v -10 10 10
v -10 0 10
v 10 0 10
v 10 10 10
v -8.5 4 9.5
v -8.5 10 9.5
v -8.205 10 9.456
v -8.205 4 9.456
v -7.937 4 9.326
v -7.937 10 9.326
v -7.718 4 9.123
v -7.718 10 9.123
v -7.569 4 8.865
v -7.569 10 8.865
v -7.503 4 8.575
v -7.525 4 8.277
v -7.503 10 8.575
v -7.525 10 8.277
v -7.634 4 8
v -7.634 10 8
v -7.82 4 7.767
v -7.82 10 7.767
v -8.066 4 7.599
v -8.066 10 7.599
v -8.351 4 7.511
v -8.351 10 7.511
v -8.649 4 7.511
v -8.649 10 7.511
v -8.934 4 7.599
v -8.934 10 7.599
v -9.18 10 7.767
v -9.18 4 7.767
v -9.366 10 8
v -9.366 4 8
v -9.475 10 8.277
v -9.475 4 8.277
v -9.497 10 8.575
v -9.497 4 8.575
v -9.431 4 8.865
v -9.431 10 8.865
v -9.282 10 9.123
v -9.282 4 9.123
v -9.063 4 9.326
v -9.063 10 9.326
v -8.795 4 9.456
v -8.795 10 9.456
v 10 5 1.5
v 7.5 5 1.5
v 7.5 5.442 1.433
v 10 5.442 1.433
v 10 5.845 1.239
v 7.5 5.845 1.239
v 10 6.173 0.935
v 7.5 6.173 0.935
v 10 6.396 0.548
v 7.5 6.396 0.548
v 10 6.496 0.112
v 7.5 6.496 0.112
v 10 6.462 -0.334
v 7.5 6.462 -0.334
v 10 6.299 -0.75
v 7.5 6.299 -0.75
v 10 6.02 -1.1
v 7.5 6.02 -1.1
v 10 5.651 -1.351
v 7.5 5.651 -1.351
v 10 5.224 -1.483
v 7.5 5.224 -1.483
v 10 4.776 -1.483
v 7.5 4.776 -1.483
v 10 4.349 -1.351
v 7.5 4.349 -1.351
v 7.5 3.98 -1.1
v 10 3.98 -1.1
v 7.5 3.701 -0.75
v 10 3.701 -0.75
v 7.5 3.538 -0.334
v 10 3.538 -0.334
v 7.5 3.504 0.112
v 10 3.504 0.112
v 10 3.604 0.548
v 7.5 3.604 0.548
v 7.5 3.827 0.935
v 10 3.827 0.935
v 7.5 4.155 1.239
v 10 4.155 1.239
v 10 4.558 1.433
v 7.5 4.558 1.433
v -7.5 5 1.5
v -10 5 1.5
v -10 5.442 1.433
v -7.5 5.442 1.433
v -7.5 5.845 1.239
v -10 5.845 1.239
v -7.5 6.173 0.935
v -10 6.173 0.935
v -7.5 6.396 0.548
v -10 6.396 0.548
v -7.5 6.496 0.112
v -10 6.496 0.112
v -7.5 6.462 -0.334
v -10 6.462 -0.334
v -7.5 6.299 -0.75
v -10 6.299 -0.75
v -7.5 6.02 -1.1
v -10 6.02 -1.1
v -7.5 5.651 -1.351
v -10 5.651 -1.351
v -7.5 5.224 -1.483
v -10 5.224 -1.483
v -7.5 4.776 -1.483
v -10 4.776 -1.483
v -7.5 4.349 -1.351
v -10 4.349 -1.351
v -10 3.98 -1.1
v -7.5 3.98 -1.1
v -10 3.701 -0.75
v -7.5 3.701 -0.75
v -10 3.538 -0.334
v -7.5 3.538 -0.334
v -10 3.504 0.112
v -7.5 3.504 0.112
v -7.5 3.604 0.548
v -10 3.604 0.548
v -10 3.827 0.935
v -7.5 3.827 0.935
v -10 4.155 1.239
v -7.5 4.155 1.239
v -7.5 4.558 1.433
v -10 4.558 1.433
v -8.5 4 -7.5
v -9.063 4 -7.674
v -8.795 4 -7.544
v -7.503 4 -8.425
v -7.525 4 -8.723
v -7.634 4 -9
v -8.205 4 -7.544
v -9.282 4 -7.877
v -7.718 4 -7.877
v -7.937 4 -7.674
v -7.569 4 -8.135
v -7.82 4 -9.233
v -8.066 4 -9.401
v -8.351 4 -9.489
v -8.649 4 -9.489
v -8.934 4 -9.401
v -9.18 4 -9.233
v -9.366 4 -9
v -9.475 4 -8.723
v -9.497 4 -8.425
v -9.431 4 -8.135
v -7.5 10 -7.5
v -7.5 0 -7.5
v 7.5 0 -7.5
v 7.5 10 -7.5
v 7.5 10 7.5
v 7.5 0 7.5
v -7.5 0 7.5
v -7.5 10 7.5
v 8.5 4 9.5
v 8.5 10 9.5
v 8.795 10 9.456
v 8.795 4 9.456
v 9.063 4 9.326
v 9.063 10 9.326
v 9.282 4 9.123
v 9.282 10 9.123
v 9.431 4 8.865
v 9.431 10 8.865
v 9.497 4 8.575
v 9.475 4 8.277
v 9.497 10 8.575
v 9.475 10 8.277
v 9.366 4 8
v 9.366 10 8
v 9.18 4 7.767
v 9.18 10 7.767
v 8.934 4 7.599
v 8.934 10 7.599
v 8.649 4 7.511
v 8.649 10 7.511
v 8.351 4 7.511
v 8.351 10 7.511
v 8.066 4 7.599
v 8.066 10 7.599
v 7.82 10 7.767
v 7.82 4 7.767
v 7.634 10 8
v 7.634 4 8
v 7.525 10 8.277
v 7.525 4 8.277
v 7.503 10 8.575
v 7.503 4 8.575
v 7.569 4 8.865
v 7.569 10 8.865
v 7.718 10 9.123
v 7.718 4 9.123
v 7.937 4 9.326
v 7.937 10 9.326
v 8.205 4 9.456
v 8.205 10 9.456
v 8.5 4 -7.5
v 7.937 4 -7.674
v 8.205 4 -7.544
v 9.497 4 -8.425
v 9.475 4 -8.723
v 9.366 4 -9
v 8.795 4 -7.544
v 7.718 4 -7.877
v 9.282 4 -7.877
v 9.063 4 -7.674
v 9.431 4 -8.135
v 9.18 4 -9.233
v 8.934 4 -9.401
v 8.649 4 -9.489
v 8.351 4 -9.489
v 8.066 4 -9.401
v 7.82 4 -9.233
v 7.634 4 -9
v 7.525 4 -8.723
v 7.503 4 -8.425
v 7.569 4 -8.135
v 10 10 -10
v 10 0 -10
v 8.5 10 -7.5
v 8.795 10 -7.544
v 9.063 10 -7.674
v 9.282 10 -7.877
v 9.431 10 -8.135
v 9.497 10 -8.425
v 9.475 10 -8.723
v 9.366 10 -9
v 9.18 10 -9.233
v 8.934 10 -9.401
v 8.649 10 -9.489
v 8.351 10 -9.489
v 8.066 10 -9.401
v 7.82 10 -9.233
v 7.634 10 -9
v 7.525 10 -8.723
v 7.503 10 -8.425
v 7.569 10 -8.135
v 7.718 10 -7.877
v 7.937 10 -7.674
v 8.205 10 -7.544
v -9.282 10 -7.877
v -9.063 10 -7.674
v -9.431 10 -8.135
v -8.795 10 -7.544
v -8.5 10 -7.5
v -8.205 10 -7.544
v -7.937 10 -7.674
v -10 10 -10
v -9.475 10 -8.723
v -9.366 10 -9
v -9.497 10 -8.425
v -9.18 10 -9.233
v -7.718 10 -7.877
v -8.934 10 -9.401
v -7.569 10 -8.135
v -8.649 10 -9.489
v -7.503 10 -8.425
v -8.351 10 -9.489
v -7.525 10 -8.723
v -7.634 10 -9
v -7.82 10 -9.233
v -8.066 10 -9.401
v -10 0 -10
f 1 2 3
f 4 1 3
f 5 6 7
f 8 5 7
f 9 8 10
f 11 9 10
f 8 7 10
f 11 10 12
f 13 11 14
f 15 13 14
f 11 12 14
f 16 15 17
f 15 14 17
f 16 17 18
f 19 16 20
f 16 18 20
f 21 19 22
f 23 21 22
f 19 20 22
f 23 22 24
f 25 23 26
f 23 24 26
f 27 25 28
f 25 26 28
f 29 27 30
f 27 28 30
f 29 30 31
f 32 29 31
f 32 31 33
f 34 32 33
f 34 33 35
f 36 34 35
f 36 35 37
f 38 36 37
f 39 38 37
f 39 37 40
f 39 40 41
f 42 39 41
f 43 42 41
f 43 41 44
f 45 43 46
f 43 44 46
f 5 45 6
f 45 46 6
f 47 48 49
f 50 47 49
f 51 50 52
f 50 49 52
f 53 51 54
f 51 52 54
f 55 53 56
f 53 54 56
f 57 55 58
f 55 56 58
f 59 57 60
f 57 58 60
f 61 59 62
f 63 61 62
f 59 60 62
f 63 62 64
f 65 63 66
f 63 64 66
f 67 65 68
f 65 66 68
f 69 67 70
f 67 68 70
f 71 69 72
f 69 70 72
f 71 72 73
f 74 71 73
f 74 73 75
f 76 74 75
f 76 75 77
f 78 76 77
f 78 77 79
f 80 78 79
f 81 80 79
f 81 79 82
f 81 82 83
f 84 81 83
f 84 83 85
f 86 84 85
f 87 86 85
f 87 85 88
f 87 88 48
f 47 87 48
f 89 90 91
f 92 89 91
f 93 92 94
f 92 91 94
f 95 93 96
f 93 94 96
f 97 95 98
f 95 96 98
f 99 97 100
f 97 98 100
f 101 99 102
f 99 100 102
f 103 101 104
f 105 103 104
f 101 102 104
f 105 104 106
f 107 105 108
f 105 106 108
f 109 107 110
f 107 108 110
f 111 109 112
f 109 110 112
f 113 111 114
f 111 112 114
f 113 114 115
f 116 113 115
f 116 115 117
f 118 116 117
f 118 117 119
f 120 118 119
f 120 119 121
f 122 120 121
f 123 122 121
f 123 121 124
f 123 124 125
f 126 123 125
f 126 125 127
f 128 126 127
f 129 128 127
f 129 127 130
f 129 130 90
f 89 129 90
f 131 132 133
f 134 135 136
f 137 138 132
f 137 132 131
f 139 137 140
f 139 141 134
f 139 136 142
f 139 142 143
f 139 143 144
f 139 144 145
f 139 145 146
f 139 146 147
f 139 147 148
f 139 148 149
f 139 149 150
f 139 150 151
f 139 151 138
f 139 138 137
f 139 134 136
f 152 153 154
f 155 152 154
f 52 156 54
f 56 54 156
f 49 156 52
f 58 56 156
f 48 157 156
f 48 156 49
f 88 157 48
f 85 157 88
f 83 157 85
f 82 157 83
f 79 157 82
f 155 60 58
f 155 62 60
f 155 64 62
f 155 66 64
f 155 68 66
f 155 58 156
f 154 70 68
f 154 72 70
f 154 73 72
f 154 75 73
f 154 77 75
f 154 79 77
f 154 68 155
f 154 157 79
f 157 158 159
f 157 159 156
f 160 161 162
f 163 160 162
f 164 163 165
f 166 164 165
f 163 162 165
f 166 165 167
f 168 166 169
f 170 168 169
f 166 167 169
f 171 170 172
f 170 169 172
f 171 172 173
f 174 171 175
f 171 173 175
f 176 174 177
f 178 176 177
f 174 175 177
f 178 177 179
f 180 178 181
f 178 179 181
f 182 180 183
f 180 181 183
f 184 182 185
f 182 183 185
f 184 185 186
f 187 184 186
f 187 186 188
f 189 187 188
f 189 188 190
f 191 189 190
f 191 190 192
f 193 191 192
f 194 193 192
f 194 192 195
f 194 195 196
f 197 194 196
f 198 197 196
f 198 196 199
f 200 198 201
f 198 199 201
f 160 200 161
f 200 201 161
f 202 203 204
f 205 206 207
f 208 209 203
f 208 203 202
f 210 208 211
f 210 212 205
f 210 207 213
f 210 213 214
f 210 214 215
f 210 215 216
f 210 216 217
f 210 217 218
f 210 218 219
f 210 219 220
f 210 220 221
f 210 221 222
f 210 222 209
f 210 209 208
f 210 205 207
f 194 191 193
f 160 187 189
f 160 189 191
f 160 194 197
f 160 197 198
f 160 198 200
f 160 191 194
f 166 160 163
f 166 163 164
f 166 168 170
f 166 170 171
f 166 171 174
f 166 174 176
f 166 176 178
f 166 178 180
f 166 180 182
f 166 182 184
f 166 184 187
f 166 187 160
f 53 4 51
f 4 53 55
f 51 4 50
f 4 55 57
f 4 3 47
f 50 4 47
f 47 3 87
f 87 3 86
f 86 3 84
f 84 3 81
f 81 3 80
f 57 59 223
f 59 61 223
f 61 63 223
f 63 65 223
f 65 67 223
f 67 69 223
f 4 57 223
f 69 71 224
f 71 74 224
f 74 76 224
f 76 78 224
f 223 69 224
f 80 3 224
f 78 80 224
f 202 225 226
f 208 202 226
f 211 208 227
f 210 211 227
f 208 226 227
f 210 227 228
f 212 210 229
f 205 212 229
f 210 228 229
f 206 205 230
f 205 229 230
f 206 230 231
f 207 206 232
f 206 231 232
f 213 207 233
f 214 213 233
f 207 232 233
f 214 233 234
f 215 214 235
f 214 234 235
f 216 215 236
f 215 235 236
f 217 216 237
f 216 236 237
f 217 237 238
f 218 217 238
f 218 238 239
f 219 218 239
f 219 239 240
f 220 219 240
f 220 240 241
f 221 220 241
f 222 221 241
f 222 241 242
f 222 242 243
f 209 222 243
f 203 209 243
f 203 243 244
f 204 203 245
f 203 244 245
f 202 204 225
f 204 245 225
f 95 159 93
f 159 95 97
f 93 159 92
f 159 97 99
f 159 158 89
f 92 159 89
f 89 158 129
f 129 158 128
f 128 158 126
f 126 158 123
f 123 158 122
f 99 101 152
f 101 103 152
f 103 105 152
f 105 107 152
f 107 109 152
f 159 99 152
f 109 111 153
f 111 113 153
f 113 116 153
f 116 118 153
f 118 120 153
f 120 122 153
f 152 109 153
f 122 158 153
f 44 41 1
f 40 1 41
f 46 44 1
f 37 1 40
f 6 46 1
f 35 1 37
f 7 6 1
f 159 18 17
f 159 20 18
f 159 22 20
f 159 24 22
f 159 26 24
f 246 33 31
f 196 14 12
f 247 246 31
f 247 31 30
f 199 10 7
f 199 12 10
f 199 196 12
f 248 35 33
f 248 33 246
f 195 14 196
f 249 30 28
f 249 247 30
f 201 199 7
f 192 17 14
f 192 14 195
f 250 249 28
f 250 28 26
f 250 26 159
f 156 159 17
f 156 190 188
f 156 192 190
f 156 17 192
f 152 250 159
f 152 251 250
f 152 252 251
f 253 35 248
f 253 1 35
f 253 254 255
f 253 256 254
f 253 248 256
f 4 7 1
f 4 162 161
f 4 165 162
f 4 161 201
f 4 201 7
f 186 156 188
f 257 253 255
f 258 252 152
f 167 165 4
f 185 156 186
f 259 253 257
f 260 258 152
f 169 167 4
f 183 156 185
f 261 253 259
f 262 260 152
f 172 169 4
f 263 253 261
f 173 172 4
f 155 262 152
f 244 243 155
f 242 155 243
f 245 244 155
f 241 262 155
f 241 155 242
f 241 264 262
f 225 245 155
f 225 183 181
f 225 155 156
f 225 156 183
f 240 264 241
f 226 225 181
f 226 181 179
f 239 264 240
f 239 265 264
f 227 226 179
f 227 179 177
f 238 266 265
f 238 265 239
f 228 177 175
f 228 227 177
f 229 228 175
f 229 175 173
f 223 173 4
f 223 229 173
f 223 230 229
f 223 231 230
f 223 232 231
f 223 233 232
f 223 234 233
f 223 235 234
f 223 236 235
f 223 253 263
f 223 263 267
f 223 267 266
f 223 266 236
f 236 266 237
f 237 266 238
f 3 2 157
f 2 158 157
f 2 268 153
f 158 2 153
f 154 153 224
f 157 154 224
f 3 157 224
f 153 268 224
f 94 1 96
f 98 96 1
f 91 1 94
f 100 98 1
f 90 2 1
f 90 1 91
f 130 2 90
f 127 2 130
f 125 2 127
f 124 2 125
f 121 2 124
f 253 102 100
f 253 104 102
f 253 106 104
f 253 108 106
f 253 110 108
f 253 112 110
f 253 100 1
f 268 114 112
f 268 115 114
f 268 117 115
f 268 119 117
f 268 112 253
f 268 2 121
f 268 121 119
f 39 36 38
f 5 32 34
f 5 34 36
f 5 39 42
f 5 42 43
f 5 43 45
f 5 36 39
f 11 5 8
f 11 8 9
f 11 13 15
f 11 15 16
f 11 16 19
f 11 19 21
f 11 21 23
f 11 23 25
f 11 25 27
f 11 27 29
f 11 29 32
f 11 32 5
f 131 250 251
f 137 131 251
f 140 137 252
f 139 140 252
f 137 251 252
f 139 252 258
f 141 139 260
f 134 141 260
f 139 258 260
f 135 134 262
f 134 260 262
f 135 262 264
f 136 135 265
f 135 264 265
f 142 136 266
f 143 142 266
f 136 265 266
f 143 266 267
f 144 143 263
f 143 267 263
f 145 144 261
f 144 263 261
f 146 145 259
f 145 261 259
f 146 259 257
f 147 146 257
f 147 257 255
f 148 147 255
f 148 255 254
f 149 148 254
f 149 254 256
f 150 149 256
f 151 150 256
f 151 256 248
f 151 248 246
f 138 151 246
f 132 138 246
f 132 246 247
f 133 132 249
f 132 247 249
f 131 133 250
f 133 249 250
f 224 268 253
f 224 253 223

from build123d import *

# Parameters (mm, degrees)
SKETCH1_W           = 20
SKETCH1_H           = 20
SKETCH1_W_2         = 15
SKETCH1_H_2         = 15
BOSS_EXTRUDE1_DEPTH = 10
SKETCH2_R           = 1.5
CUT_EXTRUDE1_DEPTH  = 25.494897428
SKETCH3_R           = 1
CUT_EXTRUDE2_DEPTH  = 6


with BuildPart() as part:
    # Sketch1 → Boss-Extrude1 (new body)
    with BuildSketch(Plane(origin=(0, 0, 0), x_dir=(1, 0, 0), z_dir=(0, 1, 0))):
        Rectangle(SKETCH1_W, SKETCH1_H)
        Rectangle(SKETCH1_W_2, SKETCH1_H_2, mode=Mode.SUBTRACT)
    extrude(amount=BOSS_EXTRUDE1_DEPTH)

    # Sketch2 → Cut-Extrude1 (cut, through all)
    with BuildSketch(Plane.ZY.offset(10)):
        with Locations((0, 5)):
            Circle(SKETCH2_R)
    extrude(amount=-CUT_EXTRUDE1_DEPTH, mode=Mode.SUBTRACT)

    # Sketch3 → Cut-Extrude2 (cut)
    with BuildSketch(Plane(origin=(0, 10, 0), x_dir=(1, 0, 0), z_dir=(0, 1, 0))):
        with Locations(Location((-8.5, 8.5, 0), (0, 0, 270))):
            Circle(SKETCH3_R)
        with Locations(Location((8.5, 8.5, 0), (0, 0, 270))):
            Circle(SKETCH3_R)
        with Locations(Location((8.5, -8.5, 0), (0, 0, 270))):
            Circle(SKETCH3_R)
        with Locations(Location((-8.5, -8.5, 0), (0, 0, 270))):
            Circle(SKETCH3_R)
    extrude(amount=-CUT_EXTRUDE2_DEPTH, mode=Mode.SUBTRACT)


solid = part.part
